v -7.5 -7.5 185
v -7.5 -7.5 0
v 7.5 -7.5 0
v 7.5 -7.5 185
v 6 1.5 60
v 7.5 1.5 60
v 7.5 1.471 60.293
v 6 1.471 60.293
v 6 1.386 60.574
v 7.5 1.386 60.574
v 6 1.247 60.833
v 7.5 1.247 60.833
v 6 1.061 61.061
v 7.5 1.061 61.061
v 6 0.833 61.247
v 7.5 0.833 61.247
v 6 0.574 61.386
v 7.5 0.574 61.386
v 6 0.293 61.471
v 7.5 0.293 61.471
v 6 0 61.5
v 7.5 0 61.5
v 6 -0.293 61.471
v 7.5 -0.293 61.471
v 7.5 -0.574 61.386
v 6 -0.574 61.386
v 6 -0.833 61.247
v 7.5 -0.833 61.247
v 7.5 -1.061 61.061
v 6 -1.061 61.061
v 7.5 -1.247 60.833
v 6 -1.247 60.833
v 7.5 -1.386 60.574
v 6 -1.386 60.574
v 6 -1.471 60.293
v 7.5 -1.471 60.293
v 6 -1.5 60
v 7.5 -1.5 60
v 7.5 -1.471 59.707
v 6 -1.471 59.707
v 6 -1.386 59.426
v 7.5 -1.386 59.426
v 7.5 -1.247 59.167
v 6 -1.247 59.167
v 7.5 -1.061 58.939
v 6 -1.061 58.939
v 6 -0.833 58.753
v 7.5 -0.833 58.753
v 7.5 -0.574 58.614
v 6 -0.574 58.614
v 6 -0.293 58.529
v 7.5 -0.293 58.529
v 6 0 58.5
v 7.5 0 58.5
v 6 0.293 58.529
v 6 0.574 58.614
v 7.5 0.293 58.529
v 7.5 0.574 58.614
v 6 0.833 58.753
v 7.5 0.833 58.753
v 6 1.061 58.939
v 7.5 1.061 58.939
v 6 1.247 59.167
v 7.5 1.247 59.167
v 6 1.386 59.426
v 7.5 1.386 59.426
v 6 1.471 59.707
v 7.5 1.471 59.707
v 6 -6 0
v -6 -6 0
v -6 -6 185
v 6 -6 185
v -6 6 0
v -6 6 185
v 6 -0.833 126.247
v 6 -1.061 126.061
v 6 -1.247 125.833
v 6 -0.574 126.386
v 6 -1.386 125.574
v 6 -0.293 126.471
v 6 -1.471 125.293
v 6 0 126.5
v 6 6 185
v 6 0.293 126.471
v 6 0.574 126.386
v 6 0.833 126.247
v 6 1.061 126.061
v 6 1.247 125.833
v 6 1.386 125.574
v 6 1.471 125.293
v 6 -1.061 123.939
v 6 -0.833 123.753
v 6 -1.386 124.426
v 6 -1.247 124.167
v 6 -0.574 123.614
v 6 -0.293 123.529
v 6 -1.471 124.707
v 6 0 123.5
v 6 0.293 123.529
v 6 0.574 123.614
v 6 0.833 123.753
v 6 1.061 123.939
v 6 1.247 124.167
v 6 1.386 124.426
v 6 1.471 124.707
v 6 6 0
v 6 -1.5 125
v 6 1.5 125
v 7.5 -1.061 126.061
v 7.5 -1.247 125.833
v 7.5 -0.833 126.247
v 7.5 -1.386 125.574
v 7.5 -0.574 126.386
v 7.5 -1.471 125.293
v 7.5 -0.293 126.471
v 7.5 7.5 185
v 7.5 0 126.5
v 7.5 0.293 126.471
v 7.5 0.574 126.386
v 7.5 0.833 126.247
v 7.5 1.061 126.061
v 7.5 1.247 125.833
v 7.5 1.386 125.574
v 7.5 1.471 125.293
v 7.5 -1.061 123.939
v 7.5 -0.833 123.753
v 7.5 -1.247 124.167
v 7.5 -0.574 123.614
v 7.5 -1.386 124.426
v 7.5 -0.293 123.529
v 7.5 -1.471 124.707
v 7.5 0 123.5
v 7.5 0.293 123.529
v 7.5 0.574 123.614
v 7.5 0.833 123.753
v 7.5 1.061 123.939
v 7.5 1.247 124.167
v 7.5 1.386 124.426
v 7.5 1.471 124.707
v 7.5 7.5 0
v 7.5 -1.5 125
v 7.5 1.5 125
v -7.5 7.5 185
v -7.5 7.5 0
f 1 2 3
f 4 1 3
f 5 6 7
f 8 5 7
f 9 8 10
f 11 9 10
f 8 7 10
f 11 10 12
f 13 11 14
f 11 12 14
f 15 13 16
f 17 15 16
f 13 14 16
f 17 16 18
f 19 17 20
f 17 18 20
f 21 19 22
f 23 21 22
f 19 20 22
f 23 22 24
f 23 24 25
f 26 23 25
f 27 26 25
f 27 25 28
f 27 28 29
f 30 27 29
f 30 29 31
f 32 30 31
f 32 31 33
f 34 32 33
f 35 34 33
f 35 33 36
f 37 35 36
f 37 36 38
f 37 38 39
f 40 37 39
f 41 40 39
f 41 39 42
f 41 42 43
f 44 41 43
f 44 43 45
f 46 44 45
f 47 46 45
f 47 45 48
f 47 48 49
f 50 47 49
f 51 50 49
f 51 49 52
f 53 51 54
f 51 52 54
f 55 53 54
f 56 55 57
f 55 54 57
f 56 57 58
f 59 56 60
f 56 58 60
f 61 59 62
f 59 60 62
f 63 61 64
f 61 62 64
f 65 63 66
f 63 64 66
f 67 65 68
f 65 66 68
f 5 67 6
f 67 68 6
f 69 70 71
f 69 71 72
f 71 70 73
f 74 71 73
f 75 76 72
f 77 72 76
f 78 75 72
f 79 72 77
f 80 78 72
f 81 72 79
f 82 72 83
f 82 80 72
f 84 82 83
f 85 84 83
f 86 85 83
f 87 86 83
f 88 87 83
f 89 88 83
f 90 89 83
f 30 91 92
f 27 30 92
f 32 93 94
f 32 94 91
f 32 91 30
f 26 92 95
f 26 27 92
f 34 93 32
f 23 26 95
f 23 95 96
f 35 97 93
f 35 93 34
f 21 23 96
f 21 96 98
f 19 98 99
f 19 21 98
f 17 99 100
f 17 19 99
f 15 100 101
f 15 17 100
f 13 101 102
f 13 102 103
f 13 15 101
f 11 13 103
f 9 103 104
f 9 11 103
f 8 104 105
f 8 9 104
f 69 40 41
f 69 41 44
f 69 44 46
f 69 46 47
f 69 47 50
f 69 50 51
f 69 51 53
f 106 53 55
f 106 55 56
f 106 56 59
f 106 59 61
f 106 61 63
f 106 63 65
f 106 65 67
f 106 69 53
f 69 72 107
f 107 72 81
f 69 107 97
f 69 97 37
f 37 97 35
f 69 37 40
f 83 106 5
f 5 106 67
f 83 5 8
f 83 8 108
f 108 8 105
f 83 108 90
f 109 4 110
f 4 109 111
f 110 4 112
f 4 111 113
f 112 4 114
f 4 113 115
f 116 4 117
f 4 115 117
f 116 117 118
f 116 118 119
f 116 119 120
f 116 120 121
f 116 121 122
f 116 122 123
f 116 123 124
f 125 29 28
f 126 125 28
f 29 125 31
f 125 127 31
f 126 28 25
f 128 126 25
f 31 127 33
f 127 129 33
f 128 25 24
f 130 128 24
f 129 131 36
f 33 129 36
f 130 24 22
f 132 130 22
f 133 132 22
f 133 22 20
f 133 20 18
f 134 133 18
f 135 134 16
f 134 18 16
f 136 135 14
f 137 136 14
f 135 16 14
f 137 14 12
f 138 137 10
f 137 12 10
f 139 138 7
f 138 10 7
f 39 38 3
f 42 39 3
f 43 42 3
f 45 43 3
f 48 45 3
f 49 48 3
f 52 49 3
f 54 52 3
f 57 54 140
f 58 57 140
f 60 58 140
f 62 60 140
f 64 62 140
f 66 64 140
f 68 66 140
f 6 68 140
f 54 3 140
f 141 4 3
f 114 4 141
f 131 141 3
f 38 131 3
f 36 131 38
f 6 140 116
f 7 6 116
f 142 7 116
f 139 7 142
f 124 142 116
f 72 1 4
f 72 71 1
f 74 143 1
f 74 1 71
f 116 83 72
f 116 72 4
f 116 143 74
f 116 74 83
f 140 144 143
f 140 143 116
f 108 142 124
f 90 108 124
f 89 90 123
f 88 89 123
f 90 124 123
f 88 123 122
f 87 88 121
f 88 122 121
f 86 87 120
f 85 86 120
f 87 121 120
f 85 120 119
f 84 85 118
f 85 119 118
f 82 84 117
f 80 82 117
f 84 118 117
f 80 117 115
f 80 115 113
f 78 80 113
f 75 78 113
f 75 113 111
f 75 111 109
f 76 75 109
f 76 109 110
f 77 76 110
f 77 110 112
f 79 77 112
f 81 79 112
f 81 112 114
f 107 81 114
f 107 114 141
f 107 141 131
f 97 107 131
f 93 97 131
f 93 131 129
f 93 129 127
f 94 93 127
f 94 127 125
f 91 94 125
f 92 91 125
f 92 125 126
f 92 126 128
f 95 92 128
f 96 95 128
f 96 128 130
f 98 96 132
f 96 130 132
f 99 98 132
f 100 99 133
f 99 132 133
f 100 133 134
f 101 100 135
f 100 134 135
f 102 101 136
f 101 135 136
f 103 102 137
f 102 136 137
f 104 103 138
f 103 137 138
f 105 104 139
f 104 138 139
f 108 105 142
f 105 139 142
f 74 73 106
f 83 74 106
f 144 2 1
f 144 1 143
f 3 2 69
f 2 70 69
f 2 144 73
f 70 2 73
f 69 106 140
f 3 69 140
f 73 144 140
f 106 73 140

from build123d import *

# Parameters (mm, degrees)
SKETCH_W     = 15
SKETCH_H     = 15
SKETCH_W_2   = 12
SKETCH_H_2   = 12
PAD_DEPTH    = 185
SKETCH001_R  = 1.5
POCKET_DEPTH = 5


with BuildPart() as part:
    # Sketch → Pad (new body)
    with BuildSketch(Plane.XY):
        Rectangle(SKETCH_W, SKETCH_H)
        Rectangle(SKETCH_W_2, SKETCH_H_2, mode=Mode.SUBTRACT)
    extrude(amount=PAD_DEPTH)

    # Sketch001 → Pocket (cut)
    with BuildSketch(Plane.YZ.offset(7.5)):
        with Locations((0, 60)):
            Circle(SKETCH001_R)
        with Locations((0, 125)):
            Circle(SKETCH001_R)
    extrude(amount=-POCKET_DEPTH, mode=Mode.SUBTRACT)


solid = part.part
